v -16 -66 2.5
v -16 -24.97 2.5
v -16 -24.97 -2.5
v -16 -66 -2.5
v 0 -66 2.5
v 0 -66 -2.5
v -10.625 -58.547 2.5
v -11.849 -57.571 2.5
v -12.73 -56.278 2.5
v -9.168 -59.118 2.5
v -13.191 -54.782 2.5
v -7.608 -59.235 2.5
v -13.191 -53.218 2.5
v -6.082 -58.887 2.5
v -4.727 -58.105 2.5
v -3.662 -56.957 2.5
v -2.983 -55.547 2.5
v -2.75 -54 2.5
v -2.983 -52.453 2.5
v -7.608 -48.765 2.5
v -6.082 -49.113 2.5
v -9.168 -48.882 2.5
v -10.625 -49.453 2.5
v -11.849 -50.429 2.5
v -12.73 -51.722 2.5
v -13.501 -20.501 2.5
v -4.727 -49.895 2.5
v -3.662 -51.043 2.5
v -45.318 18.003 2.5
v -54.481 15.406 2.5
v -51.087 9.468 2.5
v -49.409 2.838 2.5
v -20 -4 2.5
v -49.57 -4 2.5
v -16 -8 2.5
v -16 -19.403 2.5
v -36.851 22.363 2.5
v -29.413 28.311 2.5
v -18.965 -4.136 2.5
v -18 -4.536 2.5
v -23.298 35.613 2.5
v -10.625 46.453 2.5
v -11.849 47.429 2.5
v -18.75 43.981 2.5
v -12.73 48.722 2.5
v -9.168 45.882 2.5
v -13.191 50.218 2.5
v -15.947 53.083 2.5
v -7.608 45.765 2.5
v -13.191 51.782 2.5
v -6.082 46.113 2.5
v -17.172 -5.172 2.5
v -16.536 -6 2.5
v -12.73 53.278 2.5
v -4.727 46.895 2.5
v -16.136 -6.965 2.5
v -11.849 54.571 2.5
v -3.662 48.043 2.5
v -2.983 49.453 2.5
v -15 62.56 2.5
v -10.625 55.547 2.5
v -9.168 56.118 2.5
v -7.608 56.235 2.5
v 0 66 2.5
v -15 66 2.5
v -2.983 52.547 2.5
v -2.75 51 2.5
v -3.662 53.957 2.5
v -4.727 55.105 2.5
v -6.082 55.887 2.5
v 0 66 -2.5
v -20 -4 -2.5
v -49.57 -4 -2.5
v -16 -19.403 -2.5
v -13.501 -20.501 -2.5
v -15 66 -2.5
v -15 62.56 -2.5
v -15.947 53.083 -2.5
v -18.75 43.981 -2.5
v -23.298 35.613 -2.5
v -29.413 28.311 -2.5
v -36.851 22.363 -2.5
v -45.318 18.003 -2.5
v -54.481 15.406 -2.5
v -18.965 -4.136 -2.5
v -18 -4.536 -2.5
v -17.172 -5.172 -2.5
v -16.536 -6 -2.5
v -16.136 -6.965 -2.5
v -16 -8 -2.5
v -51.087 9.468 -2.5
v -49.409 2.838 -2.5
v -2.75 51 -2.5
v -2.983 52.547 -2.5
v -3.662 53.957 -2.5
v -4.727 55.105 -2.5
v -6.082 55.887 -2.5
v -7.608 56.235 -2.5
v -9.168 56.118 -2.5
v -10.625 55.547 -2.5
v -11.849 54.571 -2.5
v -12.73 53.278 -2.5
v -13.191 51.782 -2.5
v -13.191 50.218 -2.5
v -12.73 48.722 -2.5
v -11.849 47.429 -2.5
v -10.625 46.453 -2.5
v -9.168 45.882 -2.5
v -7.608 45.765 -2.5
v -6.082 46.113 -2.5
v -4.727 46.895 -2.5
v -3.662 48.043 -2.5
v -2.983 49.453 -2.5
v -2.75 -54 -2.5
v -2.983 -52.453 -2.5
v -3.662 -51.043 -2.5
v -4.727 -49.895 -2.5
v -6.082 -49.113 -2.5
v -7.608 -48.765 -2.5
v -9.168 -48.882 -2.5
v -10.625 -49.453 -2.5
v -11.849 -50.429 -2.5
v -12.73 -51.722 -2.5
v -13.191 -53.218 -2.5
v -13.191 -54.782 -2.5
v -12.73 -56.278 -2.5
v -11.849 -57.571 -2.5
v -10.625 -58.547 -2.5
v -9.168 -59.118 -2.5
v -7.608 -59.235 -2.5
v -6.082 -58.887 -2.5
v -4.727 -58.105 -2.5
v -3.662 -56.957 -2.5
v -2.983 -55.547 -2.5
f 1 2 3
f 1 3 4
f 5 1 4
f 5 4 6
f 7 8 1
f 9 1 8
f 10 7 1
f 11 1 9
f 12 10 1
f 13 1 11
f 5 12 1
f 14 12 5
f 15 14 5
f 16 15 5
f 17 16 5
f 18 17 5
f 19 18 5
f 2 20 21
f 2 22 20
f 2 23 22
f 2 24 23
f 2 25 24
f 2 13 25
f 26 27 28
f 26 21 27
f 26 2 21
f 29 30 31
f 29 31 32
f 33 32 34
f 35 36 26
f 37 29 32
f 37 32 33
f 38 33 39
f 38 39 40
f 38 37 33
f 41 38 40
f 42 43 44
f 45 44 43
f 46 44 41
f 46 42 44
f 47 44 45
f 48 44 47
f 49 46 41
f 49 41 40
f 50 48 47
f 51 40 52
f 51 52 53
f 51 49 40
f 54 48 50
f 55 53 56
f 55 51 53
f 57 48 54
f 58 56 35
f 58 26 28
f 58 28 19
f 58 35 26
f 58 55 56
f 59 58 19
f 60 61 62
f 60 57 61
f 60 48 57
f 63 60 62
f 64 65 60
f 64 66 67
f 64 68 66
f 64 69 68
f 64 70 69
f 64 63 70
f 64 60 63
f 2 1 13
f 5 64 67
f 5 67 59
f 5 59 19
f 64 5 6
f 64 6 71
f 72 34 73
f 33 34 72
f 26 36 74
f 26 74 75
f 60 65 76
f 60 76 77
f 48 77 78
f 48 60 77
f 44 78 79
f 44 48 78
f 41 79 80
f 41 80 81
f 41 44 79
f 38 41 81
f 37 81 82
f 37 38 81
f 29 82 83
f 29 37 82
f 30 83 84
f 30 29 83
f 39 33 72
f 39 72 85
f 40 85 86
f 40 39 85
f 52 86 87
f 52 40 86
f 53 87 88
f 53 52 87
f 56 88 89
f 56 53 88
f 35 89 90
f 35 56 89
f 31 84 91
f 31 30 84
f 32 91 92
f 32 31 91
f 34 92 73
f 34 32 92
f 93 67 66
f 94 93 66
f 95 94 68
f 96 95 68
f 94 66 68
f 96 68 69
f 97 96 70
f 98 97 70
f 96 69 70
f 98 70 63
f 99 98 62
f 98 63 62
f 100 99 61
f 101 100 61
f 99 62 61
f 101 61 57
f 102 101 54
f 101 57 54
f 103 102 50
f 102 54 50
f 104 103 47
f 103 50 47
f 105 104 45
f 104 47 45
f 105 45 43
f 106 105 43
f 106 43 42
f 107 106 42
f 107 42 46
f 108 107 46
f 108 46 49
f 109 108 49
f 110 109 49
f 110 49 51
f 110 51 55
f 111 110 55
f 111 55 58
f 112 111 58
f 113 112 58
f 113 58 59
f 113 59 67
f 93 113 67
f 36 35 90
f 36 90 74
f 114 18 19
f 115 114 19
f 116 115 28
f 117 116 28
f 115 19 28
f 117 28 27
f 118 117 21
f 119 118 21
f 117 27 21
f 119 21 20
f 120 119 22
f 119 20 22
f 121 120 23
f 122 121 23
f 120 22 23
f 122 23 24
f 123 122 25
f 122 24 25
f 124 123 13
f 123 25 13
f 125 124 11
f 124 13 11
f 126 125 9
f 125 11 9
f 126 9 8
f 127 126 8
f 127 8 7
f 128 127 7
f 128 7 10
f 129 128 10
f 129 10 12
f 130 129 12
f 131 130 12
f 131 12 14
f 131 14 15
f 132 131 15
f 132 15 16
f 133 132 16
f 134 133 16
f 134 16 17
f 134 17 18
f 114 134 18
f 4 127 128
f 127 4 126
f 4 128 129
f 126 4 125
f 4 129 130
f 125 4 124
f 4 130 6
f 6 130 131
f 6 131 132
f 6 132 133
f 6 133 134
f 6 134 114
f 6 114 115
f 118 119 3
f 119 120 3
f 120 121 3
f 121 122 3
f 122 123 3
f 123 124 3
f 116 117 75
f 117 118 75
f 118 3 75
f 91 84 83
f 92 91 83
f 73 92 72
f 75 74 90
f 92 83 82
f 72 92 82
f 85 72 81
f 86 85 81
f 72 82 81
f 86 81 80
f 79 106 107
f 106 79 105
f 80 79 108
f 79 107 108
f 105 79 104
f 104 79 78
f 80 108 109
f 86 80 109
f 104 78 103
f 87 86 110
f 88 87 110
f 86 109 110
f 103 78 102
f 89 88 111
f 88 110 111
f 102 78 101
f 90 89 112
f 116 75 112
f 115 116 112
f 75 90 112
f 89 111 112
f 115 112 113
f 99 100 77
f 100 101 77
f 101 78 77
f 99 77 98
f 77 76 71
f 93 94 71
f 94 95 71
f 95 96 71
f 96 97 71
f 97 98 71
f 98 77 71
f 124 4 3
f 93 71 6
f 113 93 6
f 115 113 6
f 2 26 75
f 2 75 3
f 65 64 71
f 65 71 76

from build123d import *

# Parameters (mm, degrees)
BOSS_EXTRUDE1_DEPTH = 2.5
SKETCH2_R           = 5.25
CUT_EXTRUDE1_DEPTH  = 86.727569626


with BuildPart() as part:
    # Sketch1 → Boss-Extrude1 (new, symmetric)
    with BuildSketch(Plane.XY):
        with BuildLine():
            Line((-49.57019439, -4), (-20, -4))
            ThreePointArc((-20, -4), (-17.171572875, -5.171572875), (-16, -8))
            Line((-16, -8), (-16, -19.403091525))
            Line((-16, -19.403091525), (-13.500700251, -20.50145429))
            Line((-13.500700251, -20.50145429), (-16, -24.97))
            Line((-16, -24.97), (-16, -66))
            Line((-16, -66), (0, -66))
            Line((0, -66), (0, 66))
            Line((0, 66), (-15, 66))
            Line((-15, 66), (-15, 62.56))
            ThreePointArc((-15, 62.56), (-26.17355239, 31.809747222), (-54.481338034, 15.405613876))
            ThreePointArc((-54.481338034, 15.405613876), (-50.022346721, 6.209829337), (-49.57019439, -4))
        make_face()
    extrude(amount=BOSS_EXTRUDE1_DEPTH, both=True)

    # Sketch2 → Cut-Extrude1 (cut, through all)
    with BuildSketch(Plane.XY.offset(2.5)):
        with Locations((-8, 51)):
            Circle(SKETCH2_R)
        with Locations((-8, -54)):
            Circle(SKETCH2_R)
    extrude(amount=-CUT_EXTRUDE1_DEPTH, mode=Mode.SUBTRACT)


solid = part.part
